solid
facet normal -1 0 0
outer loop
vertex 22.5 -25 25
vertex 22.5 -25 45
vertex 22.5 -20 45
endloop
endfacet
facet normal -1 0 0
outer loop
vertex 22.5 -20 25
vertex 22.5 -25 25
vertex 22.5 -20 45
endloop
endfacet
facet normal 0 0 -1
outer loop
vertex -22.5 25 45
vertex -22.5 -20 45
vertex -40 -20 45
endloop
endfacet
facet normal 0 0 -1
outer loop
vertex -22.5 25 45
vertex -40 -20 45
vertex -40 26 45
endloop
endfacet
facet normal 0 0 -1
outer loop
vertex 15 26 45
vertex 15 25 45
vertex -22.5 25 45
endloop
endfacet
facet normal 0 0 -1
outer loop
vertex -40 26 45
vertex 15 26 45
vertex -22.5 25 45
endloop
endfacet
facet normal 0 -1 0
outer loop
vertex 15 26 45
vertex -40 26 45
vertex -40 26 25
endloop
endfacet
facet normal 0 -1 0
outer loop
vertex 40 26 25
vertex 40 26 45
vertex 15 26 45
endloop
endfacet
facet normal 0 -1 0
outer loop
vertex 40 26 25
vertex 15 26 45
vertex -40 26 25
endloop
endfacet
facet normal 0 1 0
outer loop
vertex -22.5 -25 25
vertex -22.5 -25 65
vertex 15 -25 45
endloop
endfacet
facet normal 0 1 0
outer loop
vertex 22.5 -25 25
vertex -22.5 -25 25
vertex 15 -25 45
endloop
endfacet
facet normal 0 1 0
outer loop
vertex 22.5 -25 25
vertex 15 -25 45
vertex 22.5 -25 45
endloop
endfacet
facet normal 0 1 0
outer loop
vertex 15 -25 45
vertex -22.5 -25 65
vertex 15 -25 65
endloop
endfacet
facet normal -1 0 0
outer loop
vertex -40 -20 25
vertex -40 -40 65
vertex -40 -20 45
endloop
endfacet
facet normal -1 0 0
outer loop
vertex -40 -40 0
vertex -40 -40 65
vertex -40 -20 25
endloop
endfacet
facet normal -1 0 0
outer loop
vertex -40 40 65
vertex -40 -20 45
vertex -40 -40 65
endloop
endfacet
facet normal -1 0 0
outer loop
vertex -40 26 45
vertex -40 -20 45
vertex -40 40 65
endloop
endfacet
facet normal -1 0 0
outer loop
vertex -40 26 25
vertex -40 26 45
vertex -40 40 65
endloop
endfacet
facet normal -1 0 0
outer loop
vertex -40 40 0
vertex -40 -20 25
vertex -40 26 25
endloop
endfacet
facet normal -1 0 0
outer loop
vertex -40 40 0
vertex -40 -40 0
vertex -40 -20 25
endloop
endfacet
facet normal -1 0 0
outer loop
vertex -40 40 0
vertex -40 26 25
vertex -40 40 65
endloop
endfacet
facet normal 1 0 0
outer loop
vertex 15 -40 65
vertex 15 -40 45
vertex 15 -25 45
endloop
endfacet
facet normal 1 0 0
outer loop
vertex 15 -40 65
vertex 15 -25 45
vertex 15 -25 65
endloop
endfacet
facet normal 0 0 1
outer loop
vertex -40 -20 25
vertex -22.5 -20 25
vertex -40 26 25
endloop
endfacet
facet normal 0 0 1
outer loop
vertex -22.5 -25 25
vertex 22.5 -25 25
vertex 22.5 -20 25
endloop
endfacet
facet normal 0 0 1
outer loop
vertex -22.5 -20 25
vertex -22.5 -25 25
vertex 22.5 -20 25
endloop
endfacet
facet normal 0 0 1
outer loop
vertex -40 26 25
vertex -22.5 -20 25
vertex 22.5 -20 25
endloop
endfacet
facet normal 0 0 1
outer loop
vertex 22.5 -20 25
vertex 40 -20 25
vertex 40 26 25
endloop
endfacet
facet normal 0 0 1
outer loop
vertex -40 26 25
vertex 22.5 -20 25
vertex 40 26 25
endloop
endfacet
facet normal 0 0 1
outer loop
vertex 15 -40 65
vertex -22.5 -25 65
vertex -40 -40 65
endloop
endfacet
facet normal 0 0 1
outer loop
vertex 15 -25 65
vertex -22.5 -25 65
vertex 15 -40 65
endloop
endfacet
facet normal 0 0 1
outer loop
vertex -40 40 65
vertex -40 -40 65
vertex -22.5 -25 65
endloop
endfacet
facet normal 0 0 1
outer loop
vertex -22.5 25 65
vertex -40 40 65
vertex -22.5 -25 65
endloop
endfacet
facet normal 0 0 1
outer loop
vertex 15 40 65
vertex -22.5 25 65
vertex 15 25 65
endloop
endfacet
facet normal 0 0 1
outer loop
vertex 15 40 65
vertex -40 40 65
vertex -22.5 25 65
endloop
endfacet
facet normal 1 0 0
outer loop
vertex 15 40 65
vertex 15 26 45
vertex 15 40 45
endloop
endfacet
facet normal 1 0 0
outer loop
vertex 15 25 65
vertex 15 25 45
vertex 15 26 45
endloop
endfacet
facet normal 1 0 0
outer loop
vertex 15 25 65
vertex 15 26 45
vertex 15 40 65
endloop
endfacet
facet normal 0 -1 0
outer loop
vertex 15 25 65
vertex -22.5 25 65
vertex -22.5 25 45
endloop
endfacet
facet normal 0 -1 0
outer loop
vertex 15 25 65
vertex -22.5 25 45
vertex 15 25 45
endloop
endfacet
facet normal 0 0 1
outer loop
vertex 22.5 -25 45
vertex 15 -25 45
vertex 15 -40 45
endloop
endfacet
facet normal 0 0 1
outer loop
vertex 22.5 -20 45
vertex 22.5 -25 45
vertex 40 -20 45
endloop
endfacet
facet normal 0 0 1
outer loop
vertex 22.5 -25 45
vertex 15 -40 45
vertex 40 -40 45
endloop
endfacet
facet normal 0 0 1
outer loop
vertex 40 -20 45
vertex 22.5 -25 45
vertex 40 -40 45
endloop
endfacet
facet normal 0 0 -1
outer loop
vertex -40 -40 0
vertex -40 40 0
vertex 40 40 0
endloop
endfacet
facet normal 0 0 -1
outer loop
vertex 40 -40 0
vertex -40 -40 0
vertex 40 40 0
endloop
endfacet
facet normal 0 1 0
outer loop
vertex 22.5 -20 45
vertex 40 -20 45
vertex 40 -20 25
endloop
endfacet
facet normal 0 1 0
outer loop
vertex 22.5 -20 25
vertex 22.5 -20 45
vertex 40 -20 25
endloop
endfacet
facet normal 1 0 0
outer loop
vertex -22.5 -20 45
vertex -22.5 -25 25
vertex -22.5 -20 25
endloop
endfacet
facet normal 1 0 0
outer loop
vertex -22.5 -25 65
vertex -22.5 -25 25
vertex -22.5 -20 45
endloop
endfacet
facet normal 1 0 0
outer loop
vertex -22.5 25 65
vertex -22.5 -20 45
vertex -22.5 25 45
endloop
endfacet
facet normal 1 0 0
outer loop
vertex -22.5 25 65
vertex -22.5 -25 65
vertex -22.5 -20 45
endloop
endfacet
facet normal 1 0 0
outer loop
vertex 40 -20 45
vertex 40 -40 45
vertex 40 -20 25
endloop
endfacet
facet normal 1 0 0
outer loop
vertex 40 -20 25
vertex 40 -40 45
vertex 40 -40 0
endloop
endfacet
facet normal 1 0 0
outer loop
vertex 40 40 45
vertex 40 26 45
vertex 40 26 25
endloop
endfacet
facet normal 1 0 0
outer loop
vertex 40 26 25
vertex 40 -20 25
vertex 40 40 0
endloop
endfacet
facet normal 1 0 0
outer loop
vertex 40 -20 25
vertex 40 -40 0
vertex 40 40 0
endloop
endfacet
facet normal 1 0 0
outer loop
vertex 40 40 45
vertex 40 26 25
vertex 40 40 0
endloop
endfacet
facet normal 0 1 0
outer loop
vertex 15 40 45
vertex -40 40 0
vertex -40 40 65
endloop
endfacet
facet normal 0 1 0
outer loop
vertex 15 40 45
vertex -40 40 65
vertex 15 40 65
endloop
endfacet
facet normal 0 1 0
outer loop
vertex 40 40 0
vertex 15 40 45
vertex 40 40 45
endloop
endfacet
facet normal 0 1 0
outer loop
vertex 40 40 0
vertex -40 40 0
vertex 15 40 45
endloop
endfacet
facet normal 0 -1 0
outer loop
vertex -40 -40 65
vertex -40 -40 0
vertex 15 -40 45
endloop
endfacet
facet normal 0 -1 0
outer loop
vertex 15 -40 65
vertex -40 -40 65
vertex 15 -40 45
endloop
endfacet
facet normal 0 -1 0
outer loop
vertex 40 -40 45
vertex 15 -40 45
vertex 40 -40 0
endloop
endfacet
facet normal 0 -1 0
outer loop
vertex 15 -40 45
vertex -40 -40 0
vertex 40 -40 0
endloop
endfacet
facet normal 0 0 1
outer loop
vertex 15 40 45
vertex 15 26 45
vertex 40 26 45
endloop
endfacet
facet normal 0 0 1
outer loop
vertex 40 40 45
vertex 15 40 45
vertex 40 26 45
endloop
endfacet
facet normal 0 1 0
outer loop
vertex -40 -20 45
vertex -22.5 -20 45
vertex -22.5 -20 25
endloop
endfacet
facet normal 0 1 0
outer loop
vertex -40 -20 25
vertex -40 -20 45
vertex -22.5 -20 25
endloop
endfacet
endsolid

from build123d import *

# Parameters (mm, degrees)
IZIM1_W                     = 80
IZIM1_H                     = 80
Y_KSEKLIK_EKSTR_ZYON1_DEPTH = 65
IZIM3_W                     = 45
IZIM3_H                     = 50
KES_EKSTR_ZYON1_DEPTH       = 40
IZIM4_W                     = 20
IZIM4_H                     = 46
KES_EKSTR_ZYON2_DEPTH       = 80
IZIM5_W                     = 25
IZIM5_H                     = 20
KES_EKSTR_ZYON3_DEPTH       = 111.566721937


with BuildPart() as part:
    # Çizim1 → Yükseklik-Ekstrüzyon1 (new body)
    with BuildSketch(Plane.XY):
        Rectangle(IZIM1_W, IZIM1_H)
    extrude(amount=Y_KSEKLIK_EKSTR_ZYON1_DEPTH)

    # Çizim3 → Kes-Ekstrüzyon1 (cut)
    with BuildSketch(Plane.XY.offset(65)):
        Rectangle(IZIM3_W, IZIM3_H)
    extrude(amount=-KES_EKSTR_ZYON1_DEPTH, mode=Mode.SUBTRACT)

    # Çizim4 → Kes-Ekstrüzyon2 (cut)
    with BuildSketch(Plane(origin=(40, 0, 0), x_dir=(0, 0, -1), z_dir=(1, 0, 0))):
        with Locations((-35, 3)):
            Rectangle(IZIM4_W, IZIM4_H)
    extrude(amount=-KES_EKSTR_ZYON2_DEPTH, mode=Mode.SUBTRACT)

    # Çizim5 → Kes-Ekstrüzyon3 (cut, through all)
    with BuildSketch(Plane.XZ.offset(40)):
        with Locations((27.5, 55)):
            Rectangle(IZIM5_W, IZIM5_H)
    extrude(amount=-KES_EKSTR_ZYON3_DEPTH, mode=Mode.SUBTRACT)


solid = part.part
